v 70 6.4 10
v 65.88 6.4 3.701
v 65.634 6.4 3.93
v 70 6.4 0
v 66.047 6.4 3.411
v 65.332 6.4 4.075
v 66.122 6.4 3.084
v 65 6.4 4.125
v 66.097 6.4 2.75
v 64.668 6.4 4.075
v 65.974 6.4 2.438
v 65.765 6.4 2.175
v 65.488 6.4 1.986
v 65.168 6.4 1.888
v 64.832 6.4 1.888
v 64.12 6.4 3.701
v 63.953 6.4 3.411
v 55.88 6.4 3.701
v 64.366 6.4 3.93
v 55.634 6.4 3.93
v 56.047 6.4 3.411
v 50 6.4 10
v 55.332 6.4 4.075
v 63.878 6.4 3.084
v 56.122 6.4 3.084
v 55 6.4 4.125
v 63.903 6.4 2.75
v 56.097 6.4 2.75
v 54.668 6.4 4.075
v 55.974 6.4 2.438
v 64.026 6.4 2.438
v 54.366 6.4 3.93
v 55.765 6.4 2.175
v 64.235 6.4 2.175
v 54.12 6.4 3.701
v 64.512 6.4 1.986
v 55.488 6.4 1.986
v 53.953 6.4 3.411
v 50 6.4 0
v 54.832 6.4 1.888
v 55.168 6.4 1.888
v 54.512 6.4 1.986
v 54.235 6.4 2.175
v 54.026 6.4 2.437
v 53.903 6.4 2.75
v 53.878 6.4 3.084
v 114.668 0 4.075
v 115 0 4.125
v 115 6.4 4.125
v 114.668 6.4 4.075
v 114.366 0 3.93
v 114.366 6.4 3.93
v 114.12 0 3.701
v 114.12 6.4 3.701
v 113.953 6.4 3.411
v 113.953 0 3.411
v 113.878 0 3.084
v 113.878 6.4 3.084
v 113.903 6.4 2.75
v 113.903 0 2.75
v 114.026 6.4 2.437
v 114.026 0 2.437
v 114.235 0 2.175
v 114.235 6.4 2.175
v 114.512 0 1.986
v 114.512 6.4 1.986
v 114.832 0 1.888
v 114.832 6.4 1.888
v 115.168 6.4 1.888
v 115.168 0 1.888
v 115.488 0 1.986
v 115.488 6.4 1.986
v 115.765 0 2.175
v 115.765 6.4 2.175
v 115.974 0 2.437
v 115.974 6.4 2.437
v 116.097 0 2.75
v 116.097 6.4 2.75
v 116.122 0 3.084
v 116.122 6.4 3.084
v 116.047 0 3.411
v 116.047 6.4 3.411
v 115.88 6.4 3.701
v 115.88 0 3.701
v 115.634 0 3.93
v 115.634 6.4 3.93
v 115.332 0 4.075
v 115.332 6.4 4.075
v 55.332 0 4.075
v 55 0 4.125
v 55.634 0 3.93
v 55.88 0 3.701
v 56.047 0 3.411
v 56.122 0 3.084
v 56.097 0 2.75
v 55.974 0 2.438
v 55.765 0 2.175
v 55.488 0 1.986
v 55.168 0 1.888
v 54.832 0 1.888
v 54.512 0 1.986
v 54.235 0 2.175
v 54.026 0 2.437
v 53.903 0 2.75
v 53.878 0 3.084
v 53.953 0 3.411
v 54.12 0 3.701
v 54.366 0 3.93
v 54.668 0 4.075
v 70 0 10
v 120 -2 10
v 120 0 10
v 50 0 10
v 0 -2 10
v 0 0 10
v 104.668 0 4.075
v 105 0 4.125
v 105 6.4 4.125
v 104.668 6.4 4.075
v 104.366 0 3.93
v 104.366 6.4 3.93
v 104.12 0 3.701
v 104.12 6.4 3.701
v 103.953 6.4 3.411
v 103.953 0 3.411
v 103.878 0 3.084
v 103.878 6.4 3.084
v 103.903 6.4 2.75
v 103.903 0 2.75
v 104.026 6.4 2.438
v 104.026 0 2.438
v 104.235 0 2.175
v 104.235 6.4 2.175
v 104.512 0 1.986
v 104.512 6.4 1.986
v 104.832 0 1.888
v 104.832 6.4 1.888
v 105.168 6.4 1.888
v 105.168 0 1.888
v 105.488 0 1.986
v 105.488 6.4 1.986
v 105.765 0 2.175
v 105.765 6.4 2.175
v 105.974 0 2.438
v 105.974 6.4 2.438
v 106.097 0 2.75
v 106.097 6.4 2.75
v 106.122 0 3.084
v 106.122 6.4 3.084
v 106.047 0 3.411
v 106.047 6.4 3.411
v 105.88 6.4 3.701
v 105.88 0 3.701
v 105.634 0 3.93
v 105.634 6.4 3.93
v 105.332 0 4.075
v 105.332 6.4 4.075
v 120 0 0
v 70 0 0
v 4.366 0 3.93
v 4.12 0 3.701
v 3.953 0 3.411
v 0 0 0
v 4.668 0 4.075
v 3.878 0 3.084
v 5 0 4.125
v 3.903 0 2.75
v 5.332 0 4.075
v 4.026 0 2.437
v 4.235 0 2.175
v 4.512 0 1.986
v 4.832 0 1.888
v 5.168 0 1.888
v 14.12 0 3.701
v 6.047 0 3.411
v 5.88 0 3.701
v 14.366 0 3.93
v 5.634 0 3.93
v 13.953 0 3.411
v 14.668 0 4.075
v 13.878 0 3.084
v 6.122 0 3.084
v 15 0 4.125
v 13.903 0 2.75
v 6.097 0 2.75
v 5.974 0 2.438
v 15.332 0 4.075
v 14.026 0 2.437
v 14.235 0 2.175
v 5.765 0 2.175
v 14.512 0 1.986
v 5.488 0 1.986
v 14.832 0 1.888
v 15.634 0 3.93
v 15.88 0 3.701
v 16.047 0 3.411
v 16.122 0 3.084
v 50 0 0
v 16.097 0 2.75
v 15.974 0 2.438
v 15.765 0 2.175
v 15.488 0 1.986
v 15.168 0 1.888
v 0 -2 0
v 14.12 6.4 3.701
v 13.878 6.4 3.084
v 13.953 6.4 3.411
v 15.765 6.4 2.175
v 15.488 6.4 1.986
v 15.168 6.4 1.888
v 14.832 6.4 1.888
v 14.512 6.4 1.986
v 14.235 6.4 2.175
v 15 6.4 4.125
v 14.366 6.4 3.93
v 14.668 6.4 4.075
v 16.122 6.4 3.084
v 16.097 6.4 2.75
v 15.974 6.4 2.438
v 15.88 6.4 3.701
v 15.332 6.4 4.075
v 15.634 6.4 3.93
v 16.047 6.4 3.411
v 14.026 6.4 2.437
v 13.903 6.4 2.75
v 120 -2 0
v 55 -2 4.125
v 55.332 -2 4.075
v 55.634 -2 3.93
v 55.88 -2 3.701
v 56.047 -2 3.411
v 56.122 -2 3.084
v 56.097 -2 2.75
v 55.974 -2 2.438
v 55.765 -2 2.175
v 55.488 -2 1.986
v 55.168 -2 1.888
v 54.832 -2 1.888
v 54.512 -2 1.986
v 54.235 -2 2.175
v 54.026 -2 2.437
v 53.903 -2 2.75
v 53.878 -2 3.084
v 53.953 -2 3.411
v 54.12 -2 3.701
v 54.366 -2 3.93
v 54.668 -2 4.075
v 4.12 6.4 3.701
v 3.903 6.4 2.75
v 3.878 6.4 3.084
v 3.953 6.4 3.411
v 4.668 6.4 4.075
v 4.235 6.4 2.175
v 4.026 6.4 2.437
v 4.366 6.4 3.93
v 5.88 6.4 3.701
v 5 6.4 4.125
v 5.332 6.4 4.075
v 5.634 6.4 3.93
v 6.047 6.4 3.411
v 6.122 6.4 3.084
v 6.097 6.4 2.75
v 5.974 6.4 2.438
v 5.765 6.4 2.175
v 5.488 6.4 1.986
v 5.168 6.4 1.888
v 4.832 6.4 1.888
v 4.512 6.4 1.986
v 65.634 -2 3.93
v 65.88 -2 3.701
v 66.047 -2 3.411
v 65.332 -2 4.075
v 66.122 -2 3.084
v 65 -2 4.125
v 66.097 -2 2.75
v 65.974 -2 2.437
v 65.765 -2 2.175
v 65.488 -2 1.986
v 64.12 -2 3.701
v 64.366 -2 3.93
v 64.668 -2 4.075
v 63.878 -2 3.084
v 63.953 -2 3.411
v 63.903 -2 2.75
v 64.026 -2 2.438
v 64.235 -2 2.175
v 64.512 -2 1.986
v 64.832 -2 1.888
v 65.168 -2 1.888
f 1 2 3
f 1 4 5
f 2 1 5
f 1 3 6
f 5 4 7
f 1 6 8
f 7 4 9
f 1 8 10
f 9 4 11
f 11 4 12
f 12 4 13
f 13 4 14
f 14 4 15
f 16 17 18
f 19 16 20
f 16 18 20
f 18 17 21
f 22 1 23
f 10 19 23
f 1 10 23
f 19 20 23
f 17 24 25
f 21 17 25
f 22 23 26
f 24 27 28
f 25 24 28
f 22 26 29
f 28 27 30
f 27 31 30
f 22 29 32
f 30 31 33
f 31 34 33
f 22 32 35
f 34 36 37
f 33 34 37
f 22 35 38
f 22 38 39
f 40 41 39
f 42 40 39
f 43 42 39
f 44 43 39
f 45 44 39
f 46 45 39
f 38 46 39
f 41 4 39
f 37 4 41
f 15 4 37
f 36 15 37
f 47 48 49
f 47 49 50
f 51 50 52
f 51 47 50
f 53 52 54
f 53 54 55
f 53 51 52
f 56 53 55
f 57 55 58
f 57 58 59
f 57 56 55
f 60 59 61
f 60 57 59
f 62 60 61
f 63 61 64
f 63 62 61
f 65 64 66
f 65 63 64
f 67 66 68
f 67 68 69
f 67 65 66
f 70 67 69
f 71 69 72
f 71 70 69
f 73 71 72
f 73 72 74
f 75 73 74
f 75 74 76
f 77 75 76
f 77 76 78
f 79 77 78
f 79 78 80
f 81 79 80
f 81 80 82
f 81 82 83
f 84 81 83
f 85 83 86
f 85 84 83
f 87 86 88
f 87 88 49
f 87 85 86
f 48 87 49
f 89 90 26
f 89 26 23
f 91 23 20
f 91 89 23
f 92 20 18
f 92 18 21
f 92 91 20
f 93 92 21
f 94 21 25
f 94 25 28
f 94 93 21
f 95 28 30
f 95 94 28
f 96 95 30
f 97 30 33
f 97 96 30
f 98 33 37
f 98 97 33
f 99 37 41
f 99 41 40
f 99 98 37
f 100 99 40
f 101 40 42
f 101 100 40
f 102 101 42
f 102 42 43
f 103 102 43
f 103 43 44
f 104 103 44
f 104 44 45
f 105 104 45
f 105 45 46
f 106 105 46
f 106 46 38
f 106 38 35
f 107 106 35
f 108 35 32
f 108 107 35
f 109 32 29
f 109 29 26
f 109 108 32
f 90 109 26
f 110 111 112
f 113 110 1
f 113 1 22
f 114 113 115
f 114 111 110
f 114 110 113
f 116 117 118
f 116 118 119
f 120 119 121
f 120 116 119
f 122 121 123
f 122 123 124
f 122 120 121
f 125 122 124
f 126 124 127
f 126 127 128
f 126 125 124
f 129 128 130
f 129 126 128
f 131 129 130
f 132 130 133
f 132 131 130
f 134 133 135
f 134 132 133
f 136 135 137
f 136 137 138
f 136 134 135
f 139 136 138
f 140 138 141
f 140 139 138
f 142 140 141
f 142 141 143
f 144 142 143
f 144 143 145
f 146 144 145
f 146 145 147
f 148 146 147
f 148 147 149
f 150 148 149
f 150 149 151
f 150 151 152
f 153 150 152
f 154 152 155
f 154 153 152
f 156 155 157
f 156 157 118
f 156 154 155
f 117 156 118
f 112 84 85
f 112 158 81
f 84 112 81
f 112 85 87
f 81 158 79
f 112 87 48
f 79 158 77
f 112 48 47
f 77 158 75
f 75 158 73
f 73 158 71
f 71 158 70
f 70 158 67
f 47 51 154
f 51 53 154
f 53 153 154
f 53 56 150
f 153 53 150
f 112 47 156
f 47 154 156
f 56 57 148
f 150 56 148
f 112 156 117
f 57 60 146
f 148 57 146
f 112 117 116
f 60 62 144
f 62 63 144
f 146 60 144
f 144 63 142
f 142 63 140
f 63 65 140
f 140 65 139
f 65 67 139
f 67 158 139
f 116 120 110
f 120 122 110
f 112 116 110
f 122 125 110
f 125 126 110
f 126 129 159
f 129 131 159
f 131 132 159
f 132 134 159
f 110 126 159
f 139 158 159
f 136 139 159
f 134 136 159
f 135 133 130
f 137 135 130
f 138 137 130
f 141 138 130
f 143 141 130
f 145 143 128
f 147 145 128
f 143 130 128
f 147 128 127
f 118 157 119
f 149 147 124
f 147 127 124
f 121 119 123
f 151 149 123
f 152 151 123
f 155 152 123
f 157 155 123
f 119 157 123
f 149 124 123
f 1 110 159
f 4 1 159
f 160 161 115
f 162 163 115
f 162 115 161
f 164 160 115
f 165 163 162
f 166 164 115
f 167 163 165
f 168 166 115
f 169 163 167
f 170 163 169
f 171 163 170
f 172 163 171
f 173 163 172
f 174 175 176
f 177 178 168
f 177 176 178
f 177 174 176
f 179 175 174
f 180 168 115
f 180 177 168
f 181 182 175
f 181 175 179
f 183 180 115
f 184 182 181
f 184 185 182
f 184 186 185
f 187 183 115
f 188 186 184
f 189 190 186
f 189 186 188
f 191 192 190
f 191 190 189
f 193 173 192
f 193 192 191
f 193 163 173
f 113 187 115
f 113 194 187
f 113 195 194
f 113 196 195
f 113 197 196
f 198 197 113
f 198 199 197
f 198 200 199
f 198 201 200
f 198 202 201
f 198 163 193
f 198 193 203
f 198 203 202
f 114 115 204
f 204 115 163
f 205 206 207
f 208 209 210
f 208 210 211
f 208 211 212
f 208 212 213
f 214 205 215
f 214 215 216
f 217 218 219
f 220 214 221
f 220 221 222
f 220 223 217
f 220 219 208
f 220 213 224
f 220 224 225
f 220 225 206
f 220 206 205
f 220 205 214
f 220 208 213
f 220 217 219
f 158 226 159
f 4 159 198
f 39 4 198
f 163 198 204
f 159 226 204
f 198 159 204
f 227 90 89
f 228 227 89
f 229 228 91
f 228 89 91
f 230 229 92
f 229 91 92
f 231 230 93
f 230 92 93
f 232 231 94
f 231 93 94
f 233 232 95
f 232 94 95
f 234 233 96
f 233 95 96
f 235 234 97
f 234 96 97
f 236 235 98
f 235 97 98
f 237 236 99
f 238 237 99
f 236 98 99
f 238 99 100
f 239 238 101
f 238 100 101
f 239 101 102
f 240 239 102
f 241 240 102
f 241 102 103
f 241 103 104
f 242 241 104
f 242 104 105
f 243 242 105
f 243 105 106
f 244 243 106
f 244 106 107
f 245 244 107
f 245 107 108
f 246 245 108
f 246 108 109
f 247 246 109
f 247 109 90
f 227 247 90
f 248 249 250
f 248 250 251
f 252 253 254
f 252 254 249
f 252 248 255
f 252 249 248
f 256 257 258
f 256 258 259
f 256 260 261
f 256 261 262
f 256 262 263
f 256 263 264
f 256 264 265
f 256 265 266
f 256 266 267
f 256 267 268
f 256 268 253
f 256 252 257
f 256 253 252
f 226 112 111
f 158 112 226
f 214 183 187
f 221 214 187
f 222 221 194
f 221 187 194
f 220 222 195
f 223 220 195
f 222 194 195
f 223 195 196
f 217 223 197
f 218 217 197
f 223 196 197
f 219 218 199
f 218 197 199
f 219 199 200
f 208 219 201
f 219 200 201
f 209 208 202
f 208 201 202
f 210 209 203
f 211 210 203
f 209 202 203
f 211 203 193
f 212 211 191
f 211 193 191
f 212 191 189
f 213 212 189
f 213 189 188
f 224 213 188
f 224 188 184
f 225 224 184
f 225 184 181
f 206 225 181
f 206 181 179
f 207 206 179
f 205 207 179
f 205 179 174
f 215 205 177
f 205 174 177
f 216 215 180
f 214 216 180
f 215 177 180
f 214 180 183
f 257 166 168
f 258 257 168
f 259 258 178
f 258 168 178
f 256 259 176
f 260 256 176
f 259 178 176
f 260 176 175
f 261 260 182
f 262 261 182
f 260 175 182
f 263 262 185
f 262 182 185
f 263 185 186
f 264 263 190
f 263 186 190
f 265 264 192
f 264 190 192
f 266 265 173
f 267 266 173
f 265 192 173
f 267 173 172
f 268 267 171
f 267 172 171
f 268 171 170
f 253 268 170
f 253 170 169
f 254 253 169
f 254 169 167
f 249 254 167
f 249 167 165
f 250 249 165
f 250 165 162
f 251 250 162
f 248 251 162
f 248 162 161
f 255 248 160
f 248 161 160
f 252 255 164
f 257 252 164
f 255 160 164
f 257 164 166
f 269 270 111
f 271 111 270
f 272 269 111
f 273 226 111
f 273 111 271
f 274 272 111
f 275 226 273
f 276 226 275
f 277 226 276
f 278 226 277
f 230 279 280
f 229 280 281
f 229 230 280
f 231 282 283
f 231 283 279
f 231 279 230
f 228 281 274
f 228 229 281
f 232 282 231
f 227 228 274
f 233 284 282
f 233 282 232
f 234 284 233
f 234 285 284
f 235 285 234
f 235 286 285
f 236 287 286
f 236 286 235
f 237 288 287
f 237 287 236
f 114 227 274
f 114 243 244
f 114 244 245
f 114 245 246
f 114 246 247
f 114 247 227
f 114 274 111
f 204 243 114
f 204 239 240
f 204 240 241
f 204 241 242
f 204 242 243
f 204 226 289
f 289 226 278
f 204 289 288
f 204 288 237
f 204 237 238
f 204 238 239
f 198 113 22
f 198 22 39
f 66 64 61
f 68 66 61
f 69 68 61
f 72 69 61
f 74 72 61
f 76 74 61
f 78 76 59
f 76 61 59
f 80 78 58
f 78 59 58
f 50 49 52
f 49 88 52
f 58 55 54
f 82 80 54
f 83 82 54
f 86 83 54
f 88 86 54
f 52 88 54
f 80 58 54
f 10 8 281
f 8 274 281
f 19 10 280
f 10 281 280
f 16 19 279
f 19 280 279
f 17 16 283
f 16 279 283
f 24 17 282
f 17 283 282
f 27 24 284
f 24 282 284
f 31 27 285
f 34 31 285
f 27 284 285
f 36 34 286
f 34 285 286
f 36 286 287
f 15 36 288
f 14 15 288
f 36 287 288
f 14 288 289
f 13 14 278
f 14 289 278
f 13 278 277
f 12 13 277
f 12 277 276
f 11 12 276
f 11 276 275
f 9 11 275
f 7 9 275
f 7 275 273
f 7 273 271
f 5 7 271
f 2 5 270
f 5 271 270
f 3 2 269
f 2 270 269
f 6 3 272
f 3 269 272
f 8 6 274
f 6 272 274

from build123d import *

# Parameters (mm, degrees)
SKETCH2_W           = 40
SKETCH2_H           = 10
BOSS_EXTRUDE1_DEPTH = 2
SKETCH2_3_W         = 20
SKETCH2_3_H         = 10
BOSS_EXTRUDE2_DEPTH = 2
SKETCH2_4_R         = 1.125
BOSS_EXTRUDE3_DEPTH = 6.4
SKETCH4_W           = 10
SKETCH4_H           = 10
SKETCH4_R           = 1.125
BOSS_EXTRUDE4_DEPTH = 6.4
SKETCH4_2_R         = 1.125
CUT_EXTRUDE2_DEPTH  = 62.163387741


with BuildPart() as part:
    # Sketch2 → Boss-Extrude1 (new body)
    with BuildSketch(Plane(origin=(0, 0, 0), x_dir=(1, 0, 0), z_dir=(0, 1, 0))):
        with Locations((40, -5)):
            Rectangle(SKETCH2_W, SKETCH2_H)
    boss_extrude1 = extrude(amount=-BOSS_EXTRUDE1_DEPTH)

    # Sketch2<3> → Boss-Extrude2 (add)
    with BuildSketch(Plane(origin=(0, 0, 0), x_dir=(1, 0, 0), z_dir=(0, 1, 0))):
        with Locations((10, -5)):
            Rectangle(SKETCH2_3_W, SKETCH2_3_H)
    boss_extrude2 = extrude(amount=-BOSS_EXTRUDE2_DEPTH)

    # Sketch2<4> → Boss-Extrude3 (add)
    with BuildSketch(Plane(origin=(0, 0, 0), x_dir=(1, 0, 0), z_dir=(0, 1, 0))):
        with Locations((5, -3)):
            Circle(SKETCH2_4_R)
        with Locations((15, -3)):
            Circle(SKETCH2_4_R)
    boss_extrude3 = extrude(amount=BOSS_EXTRUDE3_DEPTH)

    # Sketch4 → Boss-Extrude4 (add)
    with BuildSketch(Plane(origin=(0, 0, 0), x_dir=(1, 0, 0), z_dir=(0, 1, 0))):
        with Locations((55, -5)):
            Rectangle(SKETCH4_W, SKETCH4_H)
        with Locations((55, -3)):
            Circle(SKETCH4_R, mode=Mode.SUBTRACT)
    boss_extrude4 = extrude(amount=BOSS_EXTRUDE4_DEPTH)

    # Sketch4<2> → Cut-Extrude2 (cut, through all)
    with BuildSketch(Plane(origin=(0, 0, 0), x_dir=(1, 0, 0), z_dir=(0, 1, 0))):
        with Locations((55, -3)):
            Circle(SKETCH4_2_R)
    cut_extrude2 = extrude(amount=-CUT_EXTRUDE2_DEPTH, mode=Mode.SUBTRACT)

    # Mirror2: Boss-Extrude1, Boss-Extrude2, Boss-Extrude3, Boss-Extrude4, Cut-Extrude2 across plane
    add(boss_extrude1.mirror(Plane(origin=(60, -2, 0), x_dir=(0, 0, 1), z_dir=(-1, 0, 0))))
    add(boss_extrude2.mirror(Plane(origin=(60, -2, 0), x_dir=(0, 0, 1), z_dir=(-1, 0, 0))))
    add(boss_extrude3.mirror(Plane(origin=(60, -2, 0), x_dir=(0, 0, 1), z_dir=(-1, 0, 0))))
    add(boss_extrude4.mirror(Plane(origin=(60, -2, 0), x_dir=(0, 0, 1), z_dir=(-1, 0, 0))))
    add(cut_extrude2.mirror(Plane(origin=(60, -2, 0), x_dir=(0, 0, 1), z_dir=(-1, 0, 0))), mode=Mode.SUBTRACT)


solid = part.part
